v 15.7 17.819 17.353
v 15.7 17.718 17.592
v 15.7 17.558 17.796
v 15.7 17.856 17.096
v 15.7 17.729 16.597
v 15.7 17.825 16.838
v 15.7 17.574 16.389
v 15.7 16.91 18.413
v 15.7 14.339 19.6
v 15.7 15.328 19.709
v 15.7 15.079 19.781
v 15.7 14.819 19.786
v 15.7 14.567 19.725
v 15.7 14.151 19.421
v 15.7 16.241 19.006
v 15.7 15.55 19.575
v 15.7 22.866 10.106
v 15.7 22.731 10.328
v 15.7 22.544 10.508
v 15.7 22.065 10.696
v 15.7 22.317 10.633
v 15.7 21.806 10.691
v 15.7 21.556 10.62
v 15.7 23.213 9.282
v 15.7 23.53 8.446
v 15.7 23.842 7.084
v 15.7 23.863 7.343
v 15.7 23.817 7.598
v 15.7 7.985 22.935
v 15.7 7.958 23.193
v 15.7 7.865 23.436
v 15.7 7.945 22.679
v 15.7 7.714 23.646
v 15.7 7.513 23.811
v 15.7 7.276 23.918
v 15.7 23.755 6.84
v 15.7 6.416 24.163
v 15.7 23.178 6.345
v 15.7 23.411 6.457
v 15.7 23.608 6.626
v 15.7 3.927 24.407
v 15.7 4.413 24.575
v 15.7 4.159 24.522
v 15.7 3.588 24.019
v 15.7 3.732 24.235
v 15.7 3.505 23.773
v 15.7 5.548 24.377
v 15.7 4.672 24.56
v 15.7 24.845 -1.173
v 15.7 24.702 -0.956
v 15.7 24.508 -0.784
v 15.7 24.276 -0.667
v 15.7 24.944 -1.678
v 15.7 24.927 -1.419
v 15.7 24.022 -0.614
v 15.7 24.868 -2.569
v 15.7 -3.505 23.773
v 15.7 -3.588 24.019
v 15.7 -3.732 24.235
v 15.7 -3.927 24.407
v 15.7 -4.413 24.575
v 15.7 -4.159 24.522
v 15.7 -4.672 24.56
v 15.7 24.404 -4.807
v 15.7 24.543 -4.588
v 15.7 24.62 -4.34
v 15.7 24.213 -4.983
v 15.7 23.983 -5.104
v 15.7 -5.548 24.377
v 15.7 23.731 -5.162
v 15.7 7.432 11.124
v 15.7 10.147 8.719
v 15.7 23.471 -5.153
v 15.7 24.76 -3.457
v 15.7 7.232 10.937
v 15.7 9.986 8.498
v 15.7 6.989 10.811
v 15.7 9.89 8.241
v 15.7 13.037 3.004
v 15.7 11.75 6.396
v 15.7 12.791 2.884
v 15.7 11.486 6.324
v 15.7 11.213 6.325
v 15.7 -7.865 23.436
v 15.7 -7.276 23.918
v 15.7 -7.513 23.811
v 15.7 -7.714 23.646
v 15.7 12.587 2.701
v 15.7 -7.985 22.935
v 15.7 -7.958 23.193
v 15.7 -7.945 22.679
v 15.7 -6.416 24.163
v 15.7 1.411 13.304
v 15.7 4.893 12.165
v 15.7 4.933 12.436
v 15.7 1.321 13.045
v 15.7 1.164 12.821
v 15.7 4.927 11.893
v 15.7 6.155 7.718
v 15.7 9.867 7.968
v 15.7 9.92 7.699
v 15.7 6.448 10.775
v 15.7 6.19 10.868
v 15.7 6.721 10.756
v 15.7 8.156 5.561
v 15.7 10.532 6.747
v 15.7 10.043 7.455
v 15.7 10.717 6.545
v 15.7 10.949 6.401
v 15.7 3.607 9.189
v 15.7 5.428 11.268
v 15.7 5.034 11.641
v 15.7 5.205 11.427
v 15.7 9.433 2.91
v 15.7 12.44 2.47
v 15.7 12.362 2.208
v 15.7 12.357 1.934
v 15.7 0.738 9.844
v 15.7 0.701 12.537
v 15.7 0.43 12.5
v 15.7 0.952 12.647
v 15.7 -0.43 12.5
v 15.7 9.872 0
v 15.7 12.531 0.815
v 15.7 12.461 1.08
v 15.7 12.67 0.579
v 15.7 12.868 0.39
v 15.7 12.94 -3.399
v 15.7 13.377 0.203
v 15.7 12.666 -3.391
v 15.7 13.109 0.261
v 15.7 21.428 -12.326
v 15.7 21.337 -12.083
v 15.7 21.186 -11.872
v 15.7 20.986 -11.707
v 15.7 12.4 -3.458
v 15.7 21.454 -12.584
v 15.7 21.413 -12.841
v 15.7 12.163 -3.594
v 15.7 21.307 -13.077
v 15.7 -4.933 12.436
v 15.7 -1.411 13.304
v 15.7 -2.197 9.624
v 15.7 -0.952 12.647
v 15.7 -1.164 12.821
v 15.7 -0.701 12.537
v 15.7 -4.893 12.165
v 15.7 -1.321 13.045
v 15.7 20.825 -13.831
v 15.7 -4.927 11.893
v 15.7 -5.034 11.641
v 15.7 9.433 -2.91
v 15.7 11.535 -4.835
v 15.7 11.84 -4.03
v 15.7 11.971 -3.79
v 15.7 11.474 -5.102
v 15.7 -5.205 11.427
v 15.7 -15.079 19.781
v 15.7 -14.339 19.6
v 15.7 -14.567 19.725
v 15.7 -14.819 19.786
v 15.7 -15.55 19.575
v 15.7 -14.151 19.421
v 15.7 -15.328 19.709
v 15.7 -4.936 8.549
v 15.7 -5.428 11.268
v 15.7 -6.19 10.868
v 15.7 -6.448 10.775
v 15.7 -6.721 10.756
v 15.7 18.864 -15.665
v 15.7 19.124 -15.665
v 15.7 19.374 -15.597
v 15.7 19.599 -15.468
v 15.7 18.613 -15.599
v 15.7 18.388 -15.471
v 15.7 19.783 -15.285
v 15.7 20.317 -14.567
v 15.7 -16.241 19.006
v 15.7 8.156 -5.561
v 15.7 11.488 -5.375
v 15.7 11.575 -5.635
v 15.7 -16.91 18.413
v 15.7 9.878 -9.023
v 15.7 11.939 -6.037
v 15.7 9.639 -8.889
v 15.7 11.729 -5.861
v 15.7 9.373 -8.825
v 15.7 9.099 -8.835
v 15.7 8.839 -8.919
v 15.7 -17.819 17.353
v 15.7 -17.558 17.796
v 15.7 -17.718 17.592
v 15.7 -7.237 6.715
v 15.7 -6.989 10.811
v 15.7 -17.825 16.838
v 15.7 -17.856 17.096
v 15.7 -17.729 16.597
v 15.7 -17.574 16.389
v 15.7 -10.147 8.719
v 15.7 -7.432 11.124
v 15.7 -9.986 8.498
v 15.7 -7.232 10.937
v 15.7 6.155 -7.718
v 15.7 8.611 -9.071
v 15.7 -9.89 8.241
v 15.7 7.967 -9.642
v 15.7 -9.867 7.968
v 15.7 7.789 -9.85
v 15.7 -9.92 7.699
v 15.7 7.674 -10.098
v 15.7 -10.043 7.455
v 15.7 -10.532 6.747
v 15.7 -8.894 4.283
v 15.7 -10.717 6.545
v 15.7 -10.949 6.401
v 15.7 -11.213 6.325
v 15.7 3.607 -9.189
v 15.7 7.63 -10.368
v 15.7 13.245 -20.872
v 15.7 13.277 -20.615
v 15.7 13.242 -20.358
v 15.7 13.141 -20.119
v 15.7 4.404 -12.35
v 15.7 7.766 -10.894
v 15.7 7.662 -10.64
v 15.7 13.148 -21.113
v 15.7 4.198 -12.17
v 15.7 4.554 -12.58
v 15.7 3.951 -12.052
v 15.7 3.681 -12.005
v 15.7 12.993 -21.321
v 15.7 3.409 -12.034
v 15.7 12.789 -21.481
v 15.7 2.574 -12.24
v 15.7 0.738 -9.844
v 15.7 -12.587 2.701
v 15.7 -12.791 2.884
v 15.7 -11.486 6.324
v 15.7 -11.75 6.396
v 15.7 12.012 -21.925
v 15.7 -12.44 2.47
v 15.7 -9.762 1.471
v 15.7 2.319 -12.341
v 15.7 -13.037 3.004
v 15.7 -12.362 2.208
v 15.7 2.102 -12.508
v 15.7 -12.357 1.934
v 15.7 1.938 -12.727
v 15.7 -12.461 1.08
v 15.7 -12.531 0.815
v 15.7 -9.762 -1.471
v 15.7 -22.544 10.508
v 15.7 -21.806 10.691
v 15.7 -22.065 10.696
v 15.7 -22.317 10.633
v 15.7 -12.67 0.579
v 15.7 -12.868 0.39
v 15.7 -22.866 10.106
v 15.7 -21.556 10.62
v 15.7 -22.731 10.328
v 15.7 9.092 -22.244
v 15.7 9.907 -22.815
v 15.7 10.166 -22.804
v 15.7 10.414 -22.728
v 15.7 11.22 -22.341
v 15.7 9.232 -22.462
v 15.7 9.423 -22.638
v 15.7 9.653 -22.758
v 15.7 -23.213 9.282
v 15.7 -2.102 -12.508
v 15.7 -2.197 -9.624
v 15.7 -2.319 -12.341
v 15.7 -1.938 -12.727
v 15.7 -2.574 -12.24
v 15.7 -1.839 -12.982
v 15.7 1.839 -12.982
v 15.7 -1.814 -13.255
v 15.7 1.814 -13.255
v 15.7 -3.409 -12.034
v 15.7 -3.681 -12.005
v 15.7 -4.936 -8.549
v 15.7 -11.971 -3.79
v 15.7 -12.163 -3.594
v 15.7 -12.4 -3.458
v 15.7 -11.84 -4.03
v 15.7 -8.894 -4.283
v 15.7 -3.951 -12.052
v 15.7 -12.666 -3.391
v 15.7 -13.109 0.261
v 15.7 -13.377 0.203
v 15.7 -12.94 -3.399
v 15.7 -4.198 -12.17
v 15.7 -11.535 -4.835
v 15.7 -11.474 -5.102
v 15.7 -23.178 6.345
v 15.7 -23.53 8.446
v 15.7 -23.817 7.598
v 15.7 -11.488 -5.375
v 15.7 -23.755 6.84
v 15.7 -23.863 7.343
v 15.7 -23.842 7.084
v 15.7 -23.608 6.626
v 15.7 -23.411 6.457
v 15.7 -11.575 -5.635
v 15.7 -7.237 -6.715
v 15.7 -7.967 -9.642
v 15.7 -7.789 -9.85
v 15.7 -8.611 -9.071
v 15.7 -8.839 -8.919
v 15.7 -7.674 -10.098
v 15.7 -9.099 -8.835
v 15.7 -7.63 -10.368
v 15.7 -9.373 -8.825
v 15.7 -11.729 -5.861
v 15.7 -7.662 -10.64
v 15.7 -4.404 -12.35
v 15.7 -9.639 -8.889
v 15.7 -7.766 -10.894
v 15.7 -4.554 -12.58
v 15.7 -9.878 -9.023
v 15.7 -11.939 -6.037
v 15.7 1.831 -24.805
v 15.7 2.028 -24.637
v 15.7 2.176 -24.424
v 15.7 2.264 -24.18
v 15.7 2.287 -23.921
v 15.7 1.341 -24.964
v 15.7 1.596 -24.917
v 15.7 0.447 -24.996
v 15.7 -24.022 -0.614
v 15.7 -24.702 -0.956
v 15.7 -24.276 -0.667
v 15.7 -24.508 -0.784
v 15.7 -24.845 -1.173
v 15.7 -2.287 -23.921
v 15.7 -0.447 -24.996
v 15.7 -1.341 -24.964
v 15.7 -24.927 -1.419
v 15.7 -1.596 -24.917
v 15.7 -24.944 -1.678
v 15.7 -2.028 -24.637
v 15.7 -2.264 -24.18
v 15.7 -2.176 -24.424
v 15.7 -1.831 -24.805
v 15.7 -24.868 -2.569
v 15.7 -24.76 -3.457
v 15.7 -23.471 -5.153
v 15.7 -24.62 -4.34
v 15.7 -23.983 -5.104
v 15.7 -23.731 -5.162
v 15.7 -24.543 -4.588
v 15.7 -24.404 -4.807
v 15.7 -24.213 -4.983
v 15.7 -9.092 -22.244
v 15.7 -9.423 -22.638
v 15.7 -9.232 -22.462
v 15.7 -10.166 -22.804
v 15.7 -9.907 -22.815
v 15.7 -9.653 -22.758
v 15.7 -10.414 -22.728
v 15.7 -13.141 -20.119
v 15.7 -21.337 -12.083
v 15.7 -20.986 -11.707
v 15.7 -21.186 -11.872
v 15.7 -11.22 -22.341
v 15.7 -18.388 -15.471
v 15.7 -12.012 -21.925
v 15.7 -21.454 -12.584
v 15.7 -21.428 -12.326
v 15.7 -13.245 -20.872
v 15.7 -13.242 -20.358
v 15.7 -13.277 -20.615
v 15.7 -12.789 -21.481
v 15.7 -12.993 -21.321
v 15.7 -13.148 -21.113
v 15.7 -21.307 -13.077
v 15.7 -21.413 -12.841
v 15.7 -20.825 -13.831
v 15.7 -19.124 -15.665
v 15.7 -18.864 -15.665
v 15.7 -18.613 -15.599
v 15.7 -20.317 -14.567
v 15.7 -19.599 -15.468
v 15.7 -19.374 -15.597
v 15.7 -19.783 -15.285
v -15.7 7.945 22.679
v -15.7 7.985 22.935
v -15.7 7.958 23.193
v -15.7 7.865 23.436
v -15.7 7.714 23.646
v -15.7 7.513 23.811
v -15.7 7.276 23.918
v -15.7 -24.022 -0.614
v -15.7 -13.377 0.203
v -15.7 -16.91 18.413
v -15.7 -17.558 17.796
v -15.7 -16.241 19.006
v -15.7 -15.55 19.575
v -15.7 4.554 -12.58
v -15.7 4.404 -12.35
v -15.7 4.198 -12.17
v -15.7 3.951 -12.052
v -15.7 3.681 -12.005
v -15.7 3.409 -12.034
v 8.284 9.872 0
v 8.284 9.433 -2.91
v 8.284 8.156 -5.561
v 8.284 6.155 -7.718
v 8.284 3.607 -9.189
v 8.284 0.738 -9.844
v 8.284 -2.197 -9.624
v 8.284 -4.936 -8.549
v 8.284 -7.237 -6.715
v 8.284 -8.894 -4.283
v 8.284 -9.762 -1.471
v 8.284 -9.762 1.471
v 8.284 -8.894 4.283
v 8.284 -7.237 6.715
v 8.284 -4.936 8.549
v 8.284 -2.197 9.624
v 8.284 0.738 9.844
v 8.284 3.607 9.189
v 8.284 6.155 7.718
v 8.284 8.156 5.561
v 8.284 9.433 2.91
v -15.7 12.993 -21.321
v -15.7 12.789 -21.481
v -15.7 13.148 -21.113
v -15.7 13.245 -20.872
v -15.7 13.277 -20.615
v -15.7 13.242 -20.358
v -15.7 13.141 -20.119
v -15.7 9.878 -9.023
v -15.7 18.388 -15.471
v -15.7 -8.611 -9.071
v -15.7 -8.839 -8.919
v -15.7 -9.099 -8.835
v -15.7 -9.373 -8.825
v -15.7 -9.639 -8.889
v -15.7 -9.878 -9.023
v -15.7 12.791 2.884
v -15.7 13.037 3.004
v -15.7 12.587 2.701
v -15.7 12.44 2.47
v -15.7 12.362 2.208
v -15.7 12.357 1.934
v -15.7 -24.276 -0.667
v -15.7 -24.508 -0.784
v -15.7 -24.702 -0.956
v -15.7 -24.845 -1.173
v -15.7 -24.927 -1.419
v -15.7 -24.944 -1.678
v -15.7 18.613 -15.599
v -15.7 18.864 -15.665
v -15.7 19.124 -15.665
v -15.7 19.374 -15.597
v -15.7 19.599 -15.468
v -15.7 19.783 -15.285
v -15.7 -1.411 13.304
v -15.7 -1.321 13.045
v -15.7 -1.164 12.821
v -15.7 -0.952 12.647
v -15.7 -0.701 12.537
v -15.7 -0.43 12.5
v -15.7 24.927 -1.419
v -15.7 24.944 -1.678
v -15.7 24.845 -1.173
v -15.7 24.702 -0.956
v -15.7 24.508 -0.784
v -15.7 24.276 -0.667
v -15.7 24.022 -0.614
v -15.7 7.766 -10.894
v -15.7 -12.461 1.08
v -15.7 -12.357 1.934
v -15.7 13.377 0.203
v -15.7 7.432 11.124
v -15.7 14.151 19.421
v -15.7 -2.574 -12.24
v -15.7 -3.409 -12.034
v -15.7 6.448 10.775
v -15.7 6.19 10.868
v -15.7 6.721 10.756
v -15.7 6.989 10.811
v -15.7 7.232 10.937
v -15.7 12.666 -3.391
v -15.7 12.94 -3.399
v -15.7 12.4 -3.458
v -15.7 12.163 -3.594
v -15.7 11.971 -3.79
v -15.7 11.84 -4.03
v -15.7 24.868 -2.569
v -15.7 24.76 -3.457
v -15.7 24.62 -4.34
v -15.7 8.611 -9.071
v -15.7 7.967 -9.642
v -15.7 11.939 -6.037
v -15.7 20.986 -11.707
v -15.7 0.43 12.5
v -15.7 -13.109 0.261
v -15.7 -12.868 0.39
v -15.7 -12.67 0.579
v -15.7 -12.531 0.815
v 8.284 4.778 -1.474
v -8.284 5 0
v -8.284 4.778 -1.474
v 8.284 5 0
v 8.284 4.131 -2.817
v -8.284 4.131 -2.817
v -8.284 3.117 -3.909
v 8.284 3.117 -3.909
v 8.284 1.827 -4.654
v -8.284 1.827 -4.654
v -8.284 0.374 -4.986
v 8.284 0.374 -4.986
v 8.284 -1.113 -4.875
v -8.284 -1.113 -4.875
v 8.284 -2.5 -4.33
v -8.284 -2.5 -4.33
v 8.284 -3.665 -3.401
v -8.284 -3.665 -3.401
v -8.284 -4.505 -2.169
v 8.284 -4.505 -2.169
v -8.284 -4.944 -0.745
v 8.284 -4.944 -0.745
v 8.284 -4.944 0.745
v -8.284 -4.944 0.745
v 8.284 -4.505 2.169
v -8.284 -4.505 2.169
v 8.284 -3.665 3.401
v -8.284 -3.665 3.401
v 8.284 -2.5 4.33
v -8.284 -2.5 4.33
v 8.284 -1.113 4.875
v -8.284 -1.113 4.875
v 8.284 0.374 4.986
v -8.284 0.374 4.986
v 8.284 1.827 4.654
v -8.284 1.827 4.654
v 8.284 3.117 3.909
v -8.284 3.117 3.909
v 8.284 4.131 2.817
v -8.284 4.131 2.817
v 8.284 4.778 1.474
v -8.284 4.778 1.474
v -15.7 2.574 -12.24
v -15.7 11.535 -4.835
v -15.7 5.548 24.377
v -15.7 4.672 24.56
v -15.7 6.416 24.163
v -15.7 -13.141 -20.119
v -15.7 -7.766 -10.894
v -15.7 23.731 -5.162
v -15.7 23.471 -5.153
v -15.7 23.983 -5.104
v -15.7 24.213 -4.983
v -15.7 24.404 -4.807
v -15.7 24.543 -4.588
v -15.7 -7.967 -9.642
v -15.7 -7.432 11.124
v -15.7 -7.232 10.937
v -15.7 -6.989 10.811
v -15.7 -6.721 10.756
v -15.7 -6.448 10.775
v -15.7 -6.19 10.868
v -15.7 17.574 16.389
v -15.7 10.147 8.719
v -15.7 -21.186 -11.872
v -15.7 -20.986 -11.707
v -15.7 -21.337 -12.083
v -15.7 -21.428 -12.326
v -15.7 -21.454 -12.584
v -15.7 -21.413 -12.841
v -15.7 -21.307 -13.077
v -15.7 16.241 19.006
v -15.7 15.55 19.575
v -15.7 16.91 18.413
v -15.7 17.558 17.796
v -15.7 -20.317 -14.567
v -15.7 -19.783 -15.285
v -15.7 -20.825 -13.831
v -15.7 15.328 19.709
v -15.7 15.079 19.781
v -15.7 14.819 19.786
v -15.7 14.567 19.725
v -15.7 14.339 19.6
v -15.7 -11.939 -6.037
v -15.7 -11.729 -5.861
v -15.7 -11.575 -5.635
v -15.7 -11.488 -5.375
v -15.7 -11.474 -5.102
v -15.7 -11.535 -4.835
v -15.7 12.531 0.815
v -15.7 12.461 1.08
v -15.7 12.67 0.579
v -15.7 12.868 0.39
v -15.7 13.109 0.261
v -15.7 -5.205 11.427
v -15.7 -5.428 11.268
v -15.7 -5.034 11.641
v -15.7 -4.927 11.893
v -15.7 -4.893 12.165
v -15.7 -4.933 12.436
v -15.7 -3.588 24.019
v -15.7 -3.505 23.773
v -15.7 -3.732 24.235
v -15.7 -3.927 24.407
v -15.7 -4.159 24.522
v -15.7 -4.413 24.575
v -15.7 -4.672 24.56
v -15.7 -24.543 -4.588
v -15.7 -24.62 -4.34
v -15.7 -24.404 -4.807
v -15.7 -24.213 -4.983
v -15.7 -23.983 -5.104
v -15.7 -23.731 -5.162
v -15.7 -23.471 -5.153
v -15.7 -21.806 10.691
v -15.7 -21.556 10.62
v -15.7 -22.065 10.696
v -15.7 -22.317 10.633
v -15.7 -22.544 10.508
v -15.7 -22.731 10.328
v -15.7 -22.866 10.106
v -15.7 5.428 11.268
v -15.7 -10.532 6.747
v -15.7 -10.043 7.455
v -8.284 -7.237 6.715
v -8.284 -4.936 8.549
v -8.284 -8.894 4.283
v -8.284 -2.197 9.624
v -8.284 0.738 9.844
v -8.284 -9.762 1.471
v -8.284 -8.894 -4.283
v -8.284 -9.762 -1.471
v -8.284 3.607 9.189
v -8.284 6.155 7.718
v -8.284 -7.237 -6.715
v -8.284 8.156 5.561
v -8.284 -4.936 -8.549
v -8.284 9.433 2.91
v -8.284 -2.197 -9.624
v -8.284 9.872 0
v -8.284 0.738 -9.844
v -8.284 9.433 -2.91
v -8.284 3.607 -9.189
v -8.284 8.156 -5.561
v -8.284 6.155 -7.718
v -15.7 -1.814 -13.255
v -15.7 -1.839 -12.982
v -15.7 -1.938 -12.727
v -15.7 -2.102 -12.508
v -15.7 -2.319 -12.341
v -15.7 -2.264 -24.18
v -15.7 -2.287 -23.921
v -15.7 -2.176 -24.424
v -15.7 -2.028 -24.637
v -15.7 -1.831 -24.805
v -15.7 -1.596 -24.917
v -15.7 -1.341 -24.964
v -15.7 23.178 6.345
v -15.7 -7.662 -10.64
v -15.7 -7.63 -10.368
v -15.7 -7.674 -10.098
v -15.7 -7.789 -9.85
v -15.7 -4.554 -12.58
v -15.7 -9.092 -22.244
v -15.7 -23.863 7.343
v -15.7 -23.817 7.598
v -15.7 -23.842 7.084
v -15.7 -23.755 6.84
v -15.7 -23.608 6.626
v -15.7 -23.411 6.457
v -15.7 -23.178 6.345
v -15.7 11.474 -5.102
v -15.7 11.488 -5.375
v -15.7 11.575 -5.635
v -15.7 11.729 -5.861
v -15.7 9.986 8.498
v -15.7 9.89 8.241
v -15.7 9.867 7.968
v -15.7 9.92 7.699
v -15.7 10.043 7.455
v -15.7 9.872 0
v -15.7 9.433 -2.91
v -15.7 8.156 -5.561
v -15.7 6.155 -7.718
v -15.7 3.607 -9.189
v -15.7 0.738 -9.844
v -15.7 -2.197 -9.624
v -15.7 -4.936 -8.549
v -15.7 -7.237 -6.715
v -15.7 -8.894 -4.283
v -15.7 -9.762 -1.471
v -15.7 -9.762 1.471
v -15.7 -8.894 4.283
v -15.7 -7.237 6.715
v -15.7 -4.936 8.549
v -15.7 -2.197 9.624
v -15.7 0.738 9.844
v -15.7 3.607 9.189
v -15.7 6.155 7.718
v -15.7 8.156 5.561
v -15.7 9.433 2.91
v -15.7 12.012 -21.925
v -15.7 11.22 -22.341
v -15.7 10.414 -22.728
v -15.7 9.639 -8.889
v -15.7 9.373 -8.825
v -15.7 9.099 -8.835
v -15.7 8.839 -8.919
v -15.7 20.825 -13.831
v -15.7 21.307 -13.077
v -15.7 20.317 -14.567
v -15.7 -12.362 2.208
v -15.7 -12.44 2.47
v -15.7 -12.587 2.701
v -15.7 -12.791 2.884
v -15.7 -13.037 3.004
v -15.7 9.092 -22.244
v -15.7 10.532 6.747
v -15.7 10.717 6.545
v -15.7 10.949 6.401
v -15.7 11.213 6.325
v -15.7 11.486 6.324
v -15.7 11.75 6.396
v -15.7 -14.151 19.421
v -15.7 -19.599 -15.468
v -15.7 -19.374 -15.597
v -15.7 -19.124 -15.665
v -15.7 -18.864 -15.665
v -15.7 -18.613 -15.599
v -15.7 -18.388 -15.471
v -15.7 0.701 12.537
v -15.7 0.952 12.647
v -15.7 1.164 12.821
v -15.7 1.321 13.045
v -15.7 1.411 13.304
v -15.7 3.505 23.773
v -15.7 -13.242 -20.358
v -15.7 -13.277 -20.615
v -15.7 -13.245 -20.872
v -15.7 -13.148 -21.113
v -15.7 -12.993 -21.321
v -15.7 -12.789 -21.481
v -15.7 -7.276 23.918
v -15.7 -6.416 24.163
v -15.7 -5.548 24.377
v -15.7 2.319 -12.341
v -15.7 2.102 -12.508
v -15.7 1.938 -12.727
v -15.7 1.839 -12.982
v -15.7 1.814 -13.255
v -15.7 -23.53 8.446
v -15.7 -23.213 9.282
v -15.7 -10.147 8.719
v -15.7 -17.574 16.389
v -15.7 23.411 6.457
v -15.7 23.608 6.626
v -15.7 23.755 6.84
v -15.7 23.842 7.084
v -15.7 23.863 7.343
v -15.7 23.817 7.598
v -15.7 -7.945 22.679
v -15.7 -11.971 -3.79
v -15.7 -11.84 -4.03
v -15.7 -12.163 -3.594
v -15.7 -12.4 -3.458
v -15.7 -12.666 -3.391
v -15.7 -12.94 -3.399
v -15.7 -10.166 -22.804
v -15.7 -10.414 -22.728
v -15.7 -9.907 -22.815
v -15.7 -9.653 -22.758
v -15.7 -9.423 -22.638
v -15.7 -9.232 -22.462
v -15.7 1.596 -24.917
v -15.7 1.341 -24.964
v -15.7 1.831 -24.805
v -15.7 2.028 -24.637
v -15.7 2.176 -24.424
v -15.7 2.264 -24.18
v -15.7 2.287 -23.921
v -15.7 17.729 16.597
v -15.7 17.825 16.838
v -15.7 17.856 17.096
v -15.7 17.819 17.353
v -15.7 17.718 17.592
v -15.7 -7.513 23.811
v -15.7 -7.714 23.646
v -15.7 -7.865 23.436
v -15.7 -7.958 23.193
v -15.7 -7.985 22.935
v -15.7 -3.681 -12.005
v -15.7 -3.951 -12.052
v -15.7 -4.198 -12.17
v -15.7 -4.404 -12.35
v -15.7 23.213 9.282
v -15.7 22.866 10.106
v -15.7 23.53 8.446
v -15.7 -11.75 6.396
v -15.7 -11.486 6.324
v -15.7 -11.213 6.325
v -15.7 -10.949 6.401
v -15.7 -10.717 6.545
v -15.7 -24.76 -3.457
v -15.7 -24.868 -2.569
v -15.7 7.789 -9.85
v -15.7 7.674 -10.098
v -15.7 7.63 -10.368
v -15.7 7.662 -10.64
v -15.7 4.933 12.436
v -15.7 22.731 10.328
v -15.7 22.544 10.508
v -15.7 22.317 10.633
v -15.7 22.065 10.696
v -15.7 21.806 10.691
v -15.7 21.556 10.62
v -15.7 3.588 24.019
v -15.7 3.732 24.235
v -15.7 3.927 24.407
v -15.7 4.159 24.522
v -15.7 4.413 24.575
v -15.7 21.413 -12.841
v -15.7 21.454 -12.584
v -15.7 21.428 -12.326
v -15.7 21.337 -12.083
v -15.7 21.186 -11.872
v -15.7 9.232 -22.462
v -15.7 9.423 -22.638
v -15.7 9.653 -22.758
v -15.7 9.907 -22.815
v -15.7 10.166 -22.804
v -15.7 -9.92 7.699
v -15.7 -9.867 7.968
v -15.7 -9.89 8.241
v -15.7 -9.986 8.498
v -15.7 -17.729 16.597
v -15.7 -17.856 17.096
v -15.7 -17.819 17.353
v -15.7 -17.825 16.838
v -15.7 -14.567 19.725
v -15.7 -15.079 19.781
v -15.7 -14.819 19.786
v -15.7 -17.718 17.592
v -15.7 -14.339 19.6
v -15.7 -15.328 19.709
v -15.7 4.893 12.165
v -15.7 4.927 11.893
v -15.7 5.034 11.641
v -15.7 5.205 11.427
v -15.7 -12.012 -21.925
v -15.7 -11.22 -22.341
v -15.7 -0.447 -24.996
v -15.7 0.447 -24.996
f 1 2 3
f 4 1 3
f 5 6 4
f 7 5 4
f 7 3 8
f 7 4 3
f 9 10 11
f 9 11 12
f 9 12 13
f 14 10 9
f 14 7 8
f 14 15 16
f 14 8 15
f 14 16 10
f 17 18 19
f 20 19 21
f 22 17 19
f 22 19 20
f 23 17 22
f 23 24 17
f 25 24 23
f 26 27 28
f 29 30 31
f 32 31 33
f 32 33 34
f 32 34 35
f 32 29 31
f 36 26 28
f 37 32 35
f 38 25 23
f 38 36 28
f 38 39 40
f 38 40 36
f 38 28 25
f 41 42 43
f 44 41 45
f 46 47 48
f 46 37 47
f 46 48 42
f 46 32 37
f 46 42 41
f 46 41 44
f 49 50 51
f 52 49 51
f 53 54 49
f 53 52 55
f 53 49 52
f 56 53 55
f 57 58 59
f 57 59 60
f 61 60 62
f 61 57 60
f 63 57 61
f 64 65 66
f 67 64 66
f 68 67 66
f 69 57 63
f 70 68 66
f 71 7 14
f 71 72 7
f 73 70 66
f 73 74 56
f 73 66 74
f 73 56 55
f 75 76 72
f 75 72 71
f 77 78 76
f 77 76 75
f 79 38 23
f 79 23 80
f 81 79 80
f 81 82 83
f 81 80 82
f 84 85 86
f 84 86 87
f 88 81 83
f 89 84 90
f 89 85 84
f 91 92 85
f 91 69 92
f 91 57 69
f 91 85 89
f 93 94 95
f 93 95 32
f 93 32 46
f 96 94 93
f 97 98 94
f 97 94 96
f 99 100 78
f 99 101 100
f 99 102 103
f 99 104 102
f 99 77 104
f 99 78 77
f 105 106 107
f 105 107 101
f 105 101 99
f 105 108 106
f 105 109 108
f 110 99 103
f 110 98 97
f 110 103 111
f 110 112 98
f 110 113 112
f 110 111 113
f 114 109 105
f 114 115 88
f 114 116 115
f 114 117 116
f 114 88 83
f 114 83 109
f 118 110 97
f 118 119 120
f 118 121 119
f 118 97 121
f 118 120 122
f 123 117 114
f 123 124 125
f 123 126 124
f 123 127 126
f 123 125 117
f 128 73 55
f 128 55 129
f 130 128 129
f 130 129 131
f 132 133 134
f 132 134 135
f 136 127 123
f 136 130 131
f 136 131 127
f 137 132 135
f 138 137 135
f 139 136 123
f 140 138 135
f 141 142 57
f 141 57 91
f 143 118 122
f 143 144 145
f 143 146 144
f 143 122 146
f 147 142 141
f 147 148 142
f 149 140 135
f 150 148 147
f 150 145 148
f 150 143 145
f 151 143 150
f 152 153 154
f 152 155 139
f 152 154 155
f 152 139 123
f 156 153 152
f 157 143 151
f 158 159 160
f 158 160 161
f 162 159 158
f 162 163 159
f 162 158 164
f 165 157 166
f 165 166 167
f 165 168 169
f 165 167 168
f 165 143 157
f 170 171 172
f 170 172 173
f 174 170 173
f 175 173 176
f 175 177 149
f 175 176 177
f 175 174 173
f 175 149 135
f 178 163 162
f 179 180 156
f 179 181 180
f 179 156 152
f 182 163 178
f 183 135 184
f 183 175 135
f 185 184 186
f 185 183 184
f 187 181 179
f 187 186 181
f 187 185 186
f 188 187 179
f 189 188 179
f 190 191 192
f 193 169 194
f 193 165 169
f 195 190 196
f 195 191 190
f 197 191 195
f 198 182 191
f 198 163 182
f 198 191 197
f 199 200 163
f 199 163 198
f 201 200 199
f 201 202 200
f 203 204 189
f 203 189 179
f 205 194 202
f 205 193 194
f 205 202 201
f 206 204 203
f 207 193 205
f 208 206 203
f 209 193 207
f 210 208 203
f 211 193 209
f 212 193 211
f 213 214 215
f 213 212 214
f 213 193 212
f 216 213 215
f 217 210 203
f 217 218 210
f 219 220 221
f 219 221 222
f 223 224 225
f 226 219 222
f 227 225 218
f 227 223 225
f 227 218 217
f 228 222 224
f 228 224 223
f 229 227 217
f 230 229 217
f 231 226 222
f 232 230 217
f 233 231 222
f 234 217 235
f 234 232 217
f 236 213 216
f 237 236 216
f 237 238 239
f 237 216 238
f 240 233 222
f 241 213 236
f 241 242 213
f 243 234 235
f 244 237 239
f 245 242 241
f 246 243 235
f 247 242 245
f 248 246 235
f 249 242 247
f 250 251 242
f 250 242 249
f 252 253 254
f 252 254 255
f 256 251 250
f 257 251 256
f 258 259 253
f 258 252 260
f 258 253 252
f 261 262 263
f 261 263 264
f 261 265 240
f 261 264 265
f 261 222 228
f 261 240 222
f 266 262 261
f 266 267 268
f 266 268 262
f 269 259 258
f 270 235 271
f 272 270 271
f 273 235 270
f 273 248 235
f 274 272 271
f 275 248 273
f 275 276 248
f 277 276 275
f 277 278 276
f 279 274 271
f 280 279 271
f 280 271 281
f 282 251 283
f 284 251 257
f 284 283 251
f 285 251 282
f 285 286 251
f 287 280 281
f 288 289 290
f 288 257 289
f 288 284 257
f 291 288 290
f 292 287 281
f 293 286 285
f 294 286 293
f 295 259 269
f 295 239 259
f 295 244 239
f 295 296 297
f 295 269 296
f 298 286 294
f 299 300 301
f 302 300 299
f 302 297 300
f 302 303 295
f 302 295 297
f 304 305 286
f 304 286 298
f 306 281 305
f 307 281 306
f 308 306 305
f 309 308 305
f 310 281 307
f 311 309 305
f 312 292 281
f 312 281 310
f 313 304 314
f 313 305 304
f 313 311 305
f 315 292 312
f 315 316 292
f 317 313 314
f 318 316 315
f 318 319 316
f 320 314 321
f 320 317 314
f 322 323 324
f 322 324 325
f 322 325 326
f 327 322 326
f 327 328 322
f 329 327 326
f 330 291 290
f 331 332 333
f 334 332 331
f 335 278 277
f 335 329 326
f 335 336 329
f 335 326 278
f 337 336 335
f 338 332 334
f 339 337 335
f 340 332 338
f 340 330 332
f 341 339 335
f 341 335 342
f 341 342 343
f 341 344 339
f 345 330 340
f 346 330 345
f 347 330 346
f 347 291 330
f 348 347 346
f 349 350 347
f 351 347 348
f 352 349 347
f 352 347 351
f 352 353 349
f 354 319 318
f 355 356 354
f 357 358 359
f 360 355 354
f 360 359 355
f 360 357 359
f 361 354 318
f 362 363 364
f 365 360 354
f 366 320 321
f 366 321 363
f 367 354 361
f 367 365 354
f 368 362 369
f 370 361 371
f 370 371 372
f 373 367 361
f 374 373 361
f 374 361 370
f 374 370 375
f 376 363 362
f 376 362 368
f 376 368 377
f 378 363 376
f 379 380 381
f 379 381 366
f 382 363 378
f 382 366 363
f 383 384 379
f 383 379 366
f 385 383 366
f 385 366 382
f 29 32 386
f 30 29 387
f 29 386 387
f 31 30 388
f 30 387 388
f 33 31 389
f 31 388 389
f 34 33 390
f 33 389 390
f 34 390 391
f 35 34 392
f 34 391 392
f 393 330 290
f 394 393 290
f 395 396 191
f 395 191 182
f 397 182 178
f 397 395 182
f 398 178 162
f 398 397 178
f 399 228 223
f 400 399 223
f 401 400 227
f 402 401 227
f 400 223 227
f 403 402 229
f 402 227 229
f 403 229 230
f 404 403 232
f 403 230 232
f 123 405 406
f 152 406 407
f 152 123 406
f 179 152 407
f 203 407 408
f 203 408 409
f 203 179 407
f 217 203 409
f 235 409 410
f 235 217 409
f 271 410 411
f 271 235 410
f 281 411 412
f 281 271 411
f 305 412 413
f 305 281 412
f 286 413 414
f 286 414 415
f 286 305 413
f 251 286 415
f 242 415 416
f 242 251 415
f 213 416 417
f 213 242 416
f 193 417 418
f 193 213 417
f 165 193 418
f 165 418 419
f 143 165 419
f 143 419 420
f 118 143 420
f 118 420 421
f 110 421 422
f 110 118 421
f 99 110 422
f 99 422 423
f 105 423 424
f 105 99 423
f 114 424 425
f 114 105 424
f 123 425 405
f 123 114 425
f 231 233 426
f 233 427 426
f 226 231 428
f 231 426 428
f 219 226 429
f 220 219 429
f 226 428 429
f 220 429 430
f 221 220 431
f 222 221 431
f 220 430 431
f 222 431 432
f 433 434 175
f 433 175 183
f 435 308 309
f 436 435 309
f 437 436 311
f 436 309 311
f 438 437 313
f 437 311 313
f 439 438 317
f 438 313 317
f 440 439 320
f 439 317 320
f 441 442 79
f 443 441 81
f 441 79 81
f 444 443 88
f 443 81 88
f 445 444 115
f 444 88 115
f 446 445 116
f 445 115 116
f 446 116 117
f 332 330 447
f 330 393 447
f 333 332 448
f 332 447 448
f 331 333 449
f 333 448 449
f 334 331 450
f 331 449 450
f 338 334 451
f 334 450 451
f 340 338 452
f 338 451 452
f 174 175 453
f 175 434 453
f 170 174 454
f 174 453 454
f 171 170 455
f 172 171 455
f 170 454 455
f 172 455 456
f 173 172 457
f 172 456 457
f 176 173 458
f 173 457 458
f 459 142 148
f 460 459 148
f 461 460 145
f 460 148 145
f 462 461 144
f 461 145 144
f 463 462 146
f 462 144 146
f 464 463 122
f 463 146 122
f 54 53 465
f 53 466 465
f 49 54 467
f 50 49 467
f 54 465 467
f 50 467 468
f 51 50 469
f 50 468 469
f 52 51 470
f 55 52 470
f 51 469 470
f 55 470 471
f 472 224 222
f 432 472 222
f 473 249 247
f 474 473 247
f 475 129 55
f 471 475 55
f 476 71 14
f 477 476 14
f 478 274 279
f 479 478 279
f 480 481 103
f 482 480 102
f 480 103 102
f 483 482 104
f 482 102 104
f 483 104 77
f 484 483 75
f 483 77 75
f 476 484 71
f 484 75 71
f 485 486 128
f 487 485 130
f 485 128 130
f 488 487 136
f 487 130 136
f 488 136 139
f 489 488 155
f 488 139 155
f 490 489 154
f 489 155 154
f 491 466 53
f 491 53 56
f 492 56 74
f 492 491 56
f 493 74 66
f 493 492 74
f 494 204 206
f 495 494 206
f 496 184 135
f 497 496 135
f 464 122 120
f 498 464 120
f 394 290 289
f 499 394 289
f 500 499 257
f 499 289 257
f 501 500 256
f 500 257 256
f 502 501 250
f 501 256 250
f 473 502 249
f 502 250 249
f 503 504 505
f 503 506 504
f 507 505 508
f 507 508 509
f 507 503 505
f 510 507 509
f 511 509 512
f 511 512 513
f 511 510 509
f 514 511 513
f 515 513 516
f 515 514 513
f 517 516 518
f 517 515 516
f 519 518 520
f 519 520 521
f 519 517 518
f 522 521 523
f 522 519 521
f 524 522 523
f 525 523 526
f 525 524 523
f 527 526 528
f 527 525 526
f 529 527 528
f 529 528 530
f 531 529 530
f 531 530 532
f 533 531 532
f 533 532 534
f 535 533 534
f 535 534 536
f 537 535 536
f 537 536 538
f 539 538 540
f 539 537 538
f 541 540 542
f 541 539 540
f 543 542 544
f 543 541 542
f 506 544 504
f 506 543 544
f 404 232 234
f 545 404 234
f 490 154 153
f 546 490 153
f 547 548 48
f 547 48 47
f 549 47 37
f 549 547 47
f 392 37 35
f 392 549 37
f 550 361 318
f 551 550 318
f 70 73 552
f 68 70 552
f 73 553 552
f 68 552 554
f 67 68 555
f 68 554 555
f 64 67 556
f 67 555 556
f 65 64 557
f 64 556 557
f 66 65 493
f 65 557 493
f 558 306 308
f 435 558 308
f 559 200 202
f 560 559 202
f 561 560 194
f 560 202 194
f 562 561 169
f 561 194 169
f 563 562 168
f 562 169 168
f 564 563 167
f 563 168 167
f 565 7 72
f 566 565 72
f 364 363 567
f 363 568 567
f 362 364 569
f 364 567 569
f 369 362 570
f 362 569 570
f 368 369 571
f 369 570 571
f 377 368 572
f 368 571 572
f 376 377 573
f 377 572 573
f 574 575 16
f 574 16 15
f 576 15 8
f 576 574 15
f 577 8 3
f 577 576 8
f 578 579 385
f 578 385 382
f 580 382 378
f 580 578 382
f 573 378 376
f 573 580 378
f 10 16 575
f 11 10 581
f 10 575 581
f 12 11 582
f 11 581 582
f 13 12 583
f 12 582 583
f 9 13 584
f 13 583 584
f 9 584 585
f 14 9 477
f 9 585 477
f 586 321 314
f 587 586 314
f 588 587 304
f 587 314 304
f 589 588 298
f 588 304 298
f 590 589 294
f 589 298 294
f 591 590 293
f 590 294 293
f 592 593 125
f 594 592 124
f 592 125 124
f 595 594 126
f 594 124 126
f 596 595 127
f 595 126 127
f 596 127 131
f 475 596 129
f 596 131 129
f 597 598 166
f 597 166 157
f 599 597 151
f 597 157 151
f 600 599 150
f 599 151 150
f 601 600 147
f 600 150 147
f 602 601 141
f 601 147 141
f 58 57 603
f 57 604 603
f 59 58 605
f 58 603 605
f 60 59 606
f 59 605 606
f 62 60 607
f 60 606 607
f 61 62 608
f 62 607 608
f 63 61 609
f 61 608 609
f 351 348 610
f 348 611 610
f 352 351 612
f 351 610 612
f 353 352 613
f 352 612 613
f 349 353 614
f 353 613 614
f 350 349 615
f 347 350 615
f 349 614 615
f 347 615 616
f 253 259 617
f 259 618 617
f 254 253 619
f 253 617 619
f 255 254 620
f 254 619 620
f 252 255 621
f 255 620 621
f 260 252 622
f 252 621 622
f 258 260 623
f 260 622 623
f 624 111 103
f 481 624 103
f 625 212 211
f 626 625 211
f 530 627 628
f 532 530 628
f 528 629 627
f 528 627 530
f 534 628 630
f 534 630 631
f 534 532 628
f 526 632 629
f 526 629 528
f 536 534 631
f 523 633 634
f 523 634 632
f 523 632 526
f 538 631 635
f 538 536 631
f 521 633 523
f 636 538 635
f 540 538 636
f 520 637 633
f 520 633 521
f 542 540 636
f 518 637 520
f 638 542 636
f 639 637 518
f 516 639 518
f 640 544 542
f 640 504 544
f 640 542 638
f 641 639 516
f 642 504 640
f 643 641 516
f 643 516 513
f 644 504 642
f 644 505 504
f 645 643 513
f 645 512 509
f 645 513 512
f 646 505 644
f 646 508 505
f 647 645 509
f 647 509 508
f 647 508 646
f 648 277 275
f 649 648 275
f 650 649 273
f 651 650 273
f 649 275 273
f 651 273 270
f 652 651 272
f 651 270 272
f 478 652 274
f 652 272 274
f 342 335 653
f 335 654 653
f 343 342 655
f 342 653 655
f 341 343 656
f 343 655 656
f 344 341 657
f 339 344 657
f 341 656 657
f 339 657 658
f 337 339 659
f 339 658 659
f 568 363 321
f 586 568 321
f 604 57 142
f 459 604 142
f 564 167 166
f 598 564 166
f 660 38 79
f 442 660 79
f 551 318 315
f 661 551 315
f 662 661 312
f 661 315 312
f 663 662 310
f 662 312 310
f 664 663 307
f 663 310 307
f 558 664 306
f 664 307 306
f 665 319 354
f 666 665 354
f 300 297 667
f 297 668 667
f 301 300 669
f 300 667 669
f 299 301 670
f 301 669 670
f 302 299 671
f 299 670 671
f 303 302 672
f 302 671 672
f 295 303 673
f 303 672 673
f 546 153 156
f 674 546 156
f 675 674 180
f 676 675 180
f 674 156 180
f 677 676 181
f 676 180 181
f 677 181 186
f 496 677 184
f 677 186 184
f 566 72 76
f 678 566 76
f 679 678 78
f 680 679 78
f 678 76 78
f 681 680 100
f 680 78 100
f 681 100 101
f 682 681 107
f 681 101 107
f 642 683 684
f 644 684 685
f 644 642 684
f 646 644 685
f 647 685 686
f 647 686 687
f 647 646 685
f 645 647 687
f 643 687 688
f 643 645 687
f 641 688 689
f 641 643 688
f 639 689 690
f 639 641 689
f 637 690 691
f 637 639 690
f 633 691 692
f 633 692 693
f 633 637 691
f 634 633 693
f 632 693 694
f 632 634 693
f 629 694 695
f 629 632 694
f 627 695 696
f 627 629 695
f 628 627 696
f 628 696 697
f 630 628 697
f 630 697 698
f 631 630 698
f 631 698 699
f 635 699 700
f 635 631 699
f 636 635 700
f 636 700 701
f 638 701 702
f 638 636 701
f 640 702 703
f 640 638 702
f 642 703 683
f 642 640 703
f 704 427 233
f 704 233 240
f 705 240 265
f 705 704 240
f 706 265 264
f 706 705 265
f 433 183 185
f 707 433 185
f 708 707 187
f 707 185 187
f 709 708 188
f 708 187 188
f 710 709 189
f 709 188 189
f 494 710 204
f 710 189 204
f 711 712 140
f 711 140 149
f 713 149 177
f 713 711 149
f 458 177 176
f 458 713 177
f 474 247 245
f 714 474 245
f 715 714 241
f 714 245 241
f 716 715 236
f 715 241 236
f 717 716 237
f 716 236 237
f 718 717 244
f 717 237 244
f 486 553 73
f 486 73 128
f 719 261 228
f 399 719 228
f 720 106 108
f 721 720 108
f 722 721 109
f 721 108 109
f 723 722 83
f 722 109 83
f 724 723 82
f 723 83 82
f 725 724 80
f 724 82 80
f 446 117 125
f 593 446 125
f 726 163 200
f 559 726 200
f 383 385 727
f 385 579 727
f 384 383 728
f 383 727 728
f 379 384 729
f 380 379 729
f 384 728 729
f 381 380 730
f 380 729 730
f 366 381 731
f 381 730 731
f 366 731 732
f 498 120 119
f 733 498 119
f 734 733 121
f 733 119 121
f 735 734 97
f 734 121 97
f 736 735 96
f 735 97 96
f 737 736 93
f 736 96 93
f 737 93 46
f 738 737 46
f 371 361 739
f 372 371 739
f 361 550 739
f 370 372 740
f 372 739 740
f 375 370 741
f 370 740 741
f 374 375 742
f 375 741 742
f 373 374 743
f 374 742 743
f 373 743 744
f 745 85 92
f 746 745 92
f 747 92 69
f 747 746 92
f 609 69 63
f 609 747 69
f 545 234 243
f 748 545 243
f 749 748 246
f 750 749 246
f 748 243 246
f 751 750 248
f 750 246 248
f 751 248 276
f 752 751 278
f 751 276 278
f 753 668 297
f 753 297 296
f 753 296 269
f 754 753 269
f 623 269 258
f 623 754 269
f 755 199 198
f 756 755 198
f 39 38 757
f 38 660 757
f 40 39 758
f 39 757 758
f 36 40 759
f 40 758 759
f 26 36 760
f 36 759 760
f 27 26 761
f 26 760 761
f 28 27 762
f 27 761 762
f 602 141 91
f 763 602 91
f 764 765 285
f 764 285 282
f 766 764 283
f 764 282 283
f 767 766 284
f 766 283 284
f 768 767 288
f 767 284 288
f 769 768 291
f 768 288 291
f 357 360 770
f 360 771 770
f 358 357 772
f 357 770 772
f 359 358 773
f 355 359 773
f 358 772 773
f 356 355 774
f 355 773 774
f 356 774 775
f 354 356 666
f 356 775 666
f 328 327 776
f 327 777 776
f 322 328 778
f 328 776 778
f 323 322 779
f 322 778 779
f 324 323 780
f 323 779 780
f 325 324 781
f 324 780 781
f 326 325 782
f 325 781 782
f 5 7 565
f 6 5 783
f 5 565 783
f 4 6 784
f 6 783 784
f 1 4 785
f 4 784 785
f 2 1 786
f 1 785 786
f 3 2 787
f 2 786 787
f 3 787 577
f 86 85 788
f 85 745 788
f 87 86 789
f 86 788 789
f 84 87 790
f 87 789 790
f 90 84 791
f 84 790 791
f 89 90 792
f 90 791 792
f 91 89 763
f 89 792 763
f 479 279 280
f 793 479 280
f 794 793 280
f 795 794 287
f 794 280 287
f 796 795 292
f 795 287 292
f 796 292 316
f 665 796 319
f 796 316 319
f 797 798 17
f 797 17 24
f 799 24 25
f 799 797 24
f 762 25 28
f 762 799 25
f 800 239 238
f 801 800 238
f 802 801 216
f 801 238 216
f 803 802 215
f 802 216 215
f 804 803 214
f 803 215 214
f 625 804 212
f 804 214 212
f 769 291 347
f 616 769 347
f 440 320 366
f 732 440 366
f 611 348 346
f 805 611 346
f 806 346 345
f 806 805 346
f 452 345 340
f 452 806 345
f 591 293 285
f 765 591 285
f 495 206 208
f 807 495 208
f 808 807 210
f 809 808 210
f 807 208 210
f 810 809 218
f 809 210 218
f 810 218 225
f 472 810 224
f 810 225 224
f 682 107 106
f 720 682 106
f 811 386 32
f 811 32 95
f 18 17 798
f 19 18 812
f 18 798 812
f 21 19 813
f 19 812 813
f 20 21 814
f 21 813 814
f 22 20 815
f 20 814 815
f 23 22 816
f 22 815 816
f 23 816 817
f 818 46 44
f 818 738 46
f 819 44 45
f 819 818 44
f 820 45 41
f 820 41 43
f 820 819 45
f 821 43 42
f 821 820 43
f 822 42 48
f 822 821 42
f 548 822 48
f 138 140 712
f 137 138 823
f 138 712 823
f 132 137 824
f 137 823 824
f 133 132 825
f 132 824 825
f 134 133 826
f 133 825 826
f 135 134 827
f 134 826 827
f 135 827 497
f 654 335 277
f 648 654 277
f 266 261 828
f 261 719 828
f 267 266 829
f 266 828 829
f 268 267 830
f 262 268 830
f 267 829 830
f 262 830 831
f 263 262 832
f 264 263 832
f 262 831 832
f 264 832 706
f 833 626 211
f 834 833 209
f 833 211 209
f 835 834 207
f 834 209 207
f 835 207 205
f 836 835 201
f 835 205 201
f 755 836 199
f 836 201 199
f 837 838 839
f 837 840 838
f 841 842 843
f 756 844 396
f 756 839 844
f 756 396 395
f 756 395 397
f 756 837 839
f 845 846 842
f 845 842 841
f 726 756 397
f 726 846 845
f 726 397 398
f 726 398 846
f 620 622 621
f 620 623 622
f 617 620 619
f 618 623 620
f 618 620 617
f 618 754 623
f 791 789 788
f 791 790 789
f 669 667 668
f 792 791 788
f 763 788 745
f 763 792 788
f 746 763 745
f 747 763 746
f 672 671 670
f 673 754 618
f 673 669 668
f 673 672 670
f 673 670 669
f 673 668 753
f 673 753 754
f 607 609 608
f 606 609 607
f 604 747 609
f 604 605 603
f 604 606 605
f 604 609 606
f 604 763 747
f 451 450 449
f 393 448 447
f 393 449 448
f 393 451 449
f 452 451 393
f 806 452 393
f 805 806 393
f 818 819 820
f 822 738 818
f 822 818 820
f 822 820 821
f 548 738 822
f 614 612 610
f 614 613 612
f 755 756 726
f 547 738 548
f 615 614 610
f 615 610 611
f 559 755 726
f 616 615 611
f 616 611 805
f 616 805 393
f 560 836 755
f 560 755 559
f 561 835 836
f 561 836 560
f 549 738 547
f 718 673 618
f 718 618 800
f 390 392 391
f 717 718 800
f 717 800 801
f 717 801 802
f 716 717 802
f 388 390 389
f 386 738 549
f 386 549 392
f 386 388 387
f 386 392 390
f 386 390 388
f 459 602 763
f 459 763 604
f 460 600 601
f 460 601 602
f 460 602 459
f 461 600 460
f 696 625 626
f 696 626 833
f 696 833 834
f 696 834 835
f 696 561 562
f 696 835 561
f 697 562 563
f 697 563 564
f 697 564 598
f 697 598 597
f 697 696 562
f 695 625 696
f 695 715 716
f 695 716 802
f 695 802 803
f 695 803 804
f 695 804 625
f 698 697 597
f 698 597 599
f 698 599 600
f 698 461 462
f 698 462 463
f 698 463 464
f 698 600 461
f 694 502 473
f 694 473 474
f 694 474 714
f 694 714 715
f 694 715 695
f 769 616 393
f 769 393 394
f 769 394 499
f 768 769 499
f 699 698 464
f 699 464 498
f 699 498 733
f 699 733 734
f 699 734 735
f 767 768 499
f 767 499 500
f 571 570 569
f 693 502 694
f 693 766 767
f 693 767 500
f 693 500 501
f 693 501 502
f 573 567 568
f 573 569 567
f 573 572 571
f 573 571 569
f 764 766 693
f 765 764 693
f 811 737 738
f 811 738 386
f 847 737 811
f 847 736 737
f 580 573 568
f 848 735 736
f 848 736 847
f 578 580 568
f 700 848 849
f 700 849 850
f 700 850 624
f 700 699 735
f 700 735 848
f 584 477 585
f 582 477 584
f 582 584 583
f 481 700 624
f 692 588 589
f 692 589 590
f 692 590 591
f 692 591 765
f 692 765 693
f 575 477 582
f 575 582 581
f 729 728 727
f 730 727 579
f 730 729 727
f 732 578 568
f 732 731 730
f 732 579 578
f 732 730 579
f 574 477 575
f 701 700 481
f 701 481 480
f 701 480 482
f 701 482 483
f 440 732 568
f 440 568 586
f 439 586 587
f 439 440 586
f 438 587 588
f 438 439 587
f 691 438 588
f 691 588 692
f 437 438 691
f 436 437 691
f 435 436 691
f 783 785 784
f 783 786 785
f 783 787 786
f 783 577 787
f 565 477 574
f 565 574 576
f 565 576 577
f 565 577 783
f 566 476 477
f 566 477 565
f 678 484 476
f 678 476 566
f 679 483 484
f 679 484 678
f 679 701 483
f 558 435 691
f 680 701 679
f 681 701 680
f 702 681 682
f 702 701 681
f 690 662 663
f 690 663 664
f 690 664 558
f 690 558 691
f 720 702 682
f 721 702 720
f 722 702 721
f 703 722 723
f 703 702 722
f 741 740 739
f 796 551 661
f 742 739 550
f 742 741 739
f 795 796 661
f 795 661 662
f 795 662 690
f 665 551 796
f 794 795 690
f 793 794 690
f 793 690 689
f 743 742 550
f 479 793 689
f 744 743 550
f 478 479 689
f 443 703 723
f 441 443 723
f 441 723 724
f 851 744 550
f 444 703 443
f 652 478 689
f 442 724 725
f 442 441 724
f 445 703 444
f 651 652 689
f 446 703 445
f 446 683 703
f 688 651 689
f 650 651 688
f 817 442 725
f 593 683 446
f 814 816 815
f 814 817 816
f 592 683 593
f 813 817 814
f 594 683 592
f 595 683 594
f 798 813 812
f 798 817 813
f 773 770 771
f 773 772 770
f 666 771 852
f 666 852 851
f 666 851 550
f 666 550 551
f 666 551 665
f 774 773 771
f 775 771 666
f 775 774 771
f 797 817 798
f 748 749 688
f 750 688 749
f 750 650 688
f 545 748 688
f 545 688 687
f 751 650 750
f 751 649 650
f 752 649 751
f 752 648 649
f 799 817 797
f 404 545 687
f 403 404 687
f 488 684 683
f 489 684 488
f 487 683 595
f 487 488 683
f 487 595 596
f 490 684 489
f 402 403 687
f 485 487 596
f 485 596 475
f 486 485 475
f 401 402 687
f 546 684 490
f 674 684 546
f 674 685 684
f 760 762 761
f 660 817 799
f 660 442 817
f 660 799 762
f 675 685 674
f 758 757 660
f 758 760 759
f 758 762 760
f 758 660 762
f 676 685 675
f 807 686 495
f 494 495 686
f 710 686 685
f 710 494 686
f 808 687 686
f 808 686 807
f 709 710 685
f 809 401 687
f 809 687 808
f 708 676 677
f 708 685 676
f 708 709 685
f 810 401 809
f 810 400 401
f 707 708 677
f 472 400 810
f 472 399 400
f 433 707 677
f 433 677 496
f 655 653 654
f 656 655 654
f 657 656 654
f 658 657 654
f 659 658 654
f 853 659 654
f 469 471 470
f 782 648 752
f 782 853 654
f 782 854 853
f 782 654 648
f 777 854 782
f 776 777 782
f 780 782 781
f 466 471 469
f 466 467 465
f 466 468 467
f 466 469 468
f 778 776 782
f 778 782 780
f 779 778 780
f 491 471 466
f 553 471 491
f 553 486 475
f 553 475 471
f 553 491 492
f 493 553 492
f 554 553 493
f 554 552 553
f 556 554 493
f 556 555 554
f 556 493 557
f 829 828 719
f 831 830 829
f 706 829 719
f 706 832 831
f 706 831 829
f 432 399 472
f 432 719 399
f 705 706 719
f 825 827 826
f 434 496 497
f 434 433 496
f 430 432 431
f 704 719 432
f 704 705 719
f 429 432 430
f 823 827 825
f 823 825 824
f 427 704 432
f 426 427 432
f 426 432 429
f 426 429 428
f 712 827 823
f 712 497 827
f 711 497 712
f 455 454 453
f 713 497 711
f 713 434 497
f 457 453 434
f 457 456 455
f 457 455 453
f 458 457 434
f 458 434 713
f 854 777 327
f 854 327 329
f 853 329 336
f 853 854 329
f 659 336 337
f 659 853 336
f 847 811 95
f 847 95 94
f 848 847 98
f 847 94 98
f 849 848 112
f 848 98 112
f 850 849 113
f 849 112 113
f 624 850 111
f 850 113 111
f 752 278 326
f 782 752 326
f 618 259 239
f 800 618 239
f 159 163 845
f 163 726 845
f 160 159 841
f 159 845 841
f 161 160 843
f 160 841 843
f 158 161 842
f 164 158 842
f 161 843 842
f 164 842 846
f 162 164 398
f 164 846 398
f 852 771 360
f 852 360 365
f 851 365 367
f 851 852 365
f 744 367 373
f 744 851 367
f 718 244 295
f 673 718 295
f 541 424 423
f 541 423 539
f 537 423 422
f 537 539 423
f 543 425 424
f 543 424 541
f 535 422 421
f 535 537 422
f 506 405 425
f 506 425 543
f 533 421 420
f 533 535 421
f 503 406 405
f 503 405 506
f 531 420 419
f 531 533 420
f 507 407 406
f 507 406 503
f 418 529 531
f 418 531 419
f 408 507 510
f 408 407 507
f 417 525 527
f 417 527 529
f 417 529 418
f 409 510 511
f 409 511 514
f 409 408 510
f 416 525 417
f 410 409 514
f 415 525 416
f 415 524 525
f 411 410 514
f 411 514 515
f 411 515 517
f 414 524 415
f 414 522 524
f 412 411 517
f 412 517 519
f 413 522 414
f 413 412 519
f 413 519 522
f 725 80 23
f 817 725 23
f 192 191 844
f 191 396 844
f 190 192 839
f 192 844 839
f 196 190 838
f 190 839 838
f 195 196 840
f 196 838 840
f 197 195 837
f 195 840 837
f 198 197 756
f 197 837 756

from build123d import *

# Parameters (mm, degrees)
F3_DEPTH = 35
F4_COUNT = 13
F5_R     = 1


with BuildPart() as f1:
    # F0 (on Top) → F1 (revolve)
    with BuildSketch(Plane.XY):
        Polygon((-8.284023578, 9.8717947562), (-8.284023578, 5), (8.284023578, 5), (8.284023578, 9.8717947562), (15.7001973844, 9.8717947562), (15.7001973844, 25), (-15.7001973844, 25), (-15.7001973844, 9.8717947562), align=None)
    revolve(axis=Axis((-9.4565218315, 0, 0), (-1, 0, 0)))

    # F2 (on face) → F3 (cut)
    with BuildSketch(Plane.YZ.offset(15.7001973844)):
        with BuildLine():
            Line((0, 25), (-3.75, 25))
            Line((-3.75, 25), (-1.410776773, 13.3038838649))
            ThreePointArc((-1.410776773, 13.3038838649), (-1.0641850029, 12.7266578587), (-0.4301960973, 12.5))
            Line((-0.4301960973, 12.5), (0, 12.5))
            Line((0, 12.5), (0, 25))
        make_face()
        with BuildLine():
            Line((3.75, 25), (0, 25))
            Line((0, 25), (0, 12.5))
            Line((0, 12.5), (0.4301960973, 12.5))
            ThreePointArc((0.4301960973, 12.5), (1.0641850029, 12.7266578587), (1.410776773, 13.3038838649))
            Line((1.410776773, 13.3038838649), (3.75, 25))
        make_face()
    f3 = extrude(amount=-F3_DEPTH, mode=Mode.SUBTRACT)

    # F4: F3 ×13 about axis
    f4_axis = Axis((15.7001973844, 0, 0), (-1, 0, 0))
    for i in range(1, F4_COUNT):
        add(f3.rotate(f4_axis, i * 360 / F4_COUNT), mode=Mode.SUBTRACT)

    # F5
    f5_edges = [f1.edges().sort_by_distance(p)[0] for p in [
        (0, 14.76231, 20.17608),
        (0, -3.695084, 24.725419),
        (0, 3.695084, 24.725419),
        (0, -14.76231, 20.17608),
        (0, -8.218641, 23.610463),
        (0, -22.447668, 11.004645),
        (0, -18.249574, 17.086633),
        (0, -24.990536, -0.687823),
        (0, -24.09975, 6.648462),
        (0, -21.808374, -12.222718),
        (0, 22.447668, 11.004645),
        (0, 8.218641, 23.610463),
        (0, 24.990536, -0.687823),
        (0, 18.249574, 17.086633),
        (0, 21.808374, -12.222718),
        (0, 24.09975, 6.648462),
        (0, 24.428963, -5.312791),
        (0, 13.630176, -20.957536),
        (0, 19.161796, -16.056948),
        (0, 2.329469, -24.891235),
        (0, 9.504892, -23.122652),
        (0, -9.504892, -23.122652),
        (0, -2.329469, -24.891235),
        (0, -19.161796, -16.056948),
        (0, -13.630176, -20.957536),
        (0, -24.428963, -5.312791),
    ]]
    fillet(f5_edges, radius=F5_R)


solid = f1.part
